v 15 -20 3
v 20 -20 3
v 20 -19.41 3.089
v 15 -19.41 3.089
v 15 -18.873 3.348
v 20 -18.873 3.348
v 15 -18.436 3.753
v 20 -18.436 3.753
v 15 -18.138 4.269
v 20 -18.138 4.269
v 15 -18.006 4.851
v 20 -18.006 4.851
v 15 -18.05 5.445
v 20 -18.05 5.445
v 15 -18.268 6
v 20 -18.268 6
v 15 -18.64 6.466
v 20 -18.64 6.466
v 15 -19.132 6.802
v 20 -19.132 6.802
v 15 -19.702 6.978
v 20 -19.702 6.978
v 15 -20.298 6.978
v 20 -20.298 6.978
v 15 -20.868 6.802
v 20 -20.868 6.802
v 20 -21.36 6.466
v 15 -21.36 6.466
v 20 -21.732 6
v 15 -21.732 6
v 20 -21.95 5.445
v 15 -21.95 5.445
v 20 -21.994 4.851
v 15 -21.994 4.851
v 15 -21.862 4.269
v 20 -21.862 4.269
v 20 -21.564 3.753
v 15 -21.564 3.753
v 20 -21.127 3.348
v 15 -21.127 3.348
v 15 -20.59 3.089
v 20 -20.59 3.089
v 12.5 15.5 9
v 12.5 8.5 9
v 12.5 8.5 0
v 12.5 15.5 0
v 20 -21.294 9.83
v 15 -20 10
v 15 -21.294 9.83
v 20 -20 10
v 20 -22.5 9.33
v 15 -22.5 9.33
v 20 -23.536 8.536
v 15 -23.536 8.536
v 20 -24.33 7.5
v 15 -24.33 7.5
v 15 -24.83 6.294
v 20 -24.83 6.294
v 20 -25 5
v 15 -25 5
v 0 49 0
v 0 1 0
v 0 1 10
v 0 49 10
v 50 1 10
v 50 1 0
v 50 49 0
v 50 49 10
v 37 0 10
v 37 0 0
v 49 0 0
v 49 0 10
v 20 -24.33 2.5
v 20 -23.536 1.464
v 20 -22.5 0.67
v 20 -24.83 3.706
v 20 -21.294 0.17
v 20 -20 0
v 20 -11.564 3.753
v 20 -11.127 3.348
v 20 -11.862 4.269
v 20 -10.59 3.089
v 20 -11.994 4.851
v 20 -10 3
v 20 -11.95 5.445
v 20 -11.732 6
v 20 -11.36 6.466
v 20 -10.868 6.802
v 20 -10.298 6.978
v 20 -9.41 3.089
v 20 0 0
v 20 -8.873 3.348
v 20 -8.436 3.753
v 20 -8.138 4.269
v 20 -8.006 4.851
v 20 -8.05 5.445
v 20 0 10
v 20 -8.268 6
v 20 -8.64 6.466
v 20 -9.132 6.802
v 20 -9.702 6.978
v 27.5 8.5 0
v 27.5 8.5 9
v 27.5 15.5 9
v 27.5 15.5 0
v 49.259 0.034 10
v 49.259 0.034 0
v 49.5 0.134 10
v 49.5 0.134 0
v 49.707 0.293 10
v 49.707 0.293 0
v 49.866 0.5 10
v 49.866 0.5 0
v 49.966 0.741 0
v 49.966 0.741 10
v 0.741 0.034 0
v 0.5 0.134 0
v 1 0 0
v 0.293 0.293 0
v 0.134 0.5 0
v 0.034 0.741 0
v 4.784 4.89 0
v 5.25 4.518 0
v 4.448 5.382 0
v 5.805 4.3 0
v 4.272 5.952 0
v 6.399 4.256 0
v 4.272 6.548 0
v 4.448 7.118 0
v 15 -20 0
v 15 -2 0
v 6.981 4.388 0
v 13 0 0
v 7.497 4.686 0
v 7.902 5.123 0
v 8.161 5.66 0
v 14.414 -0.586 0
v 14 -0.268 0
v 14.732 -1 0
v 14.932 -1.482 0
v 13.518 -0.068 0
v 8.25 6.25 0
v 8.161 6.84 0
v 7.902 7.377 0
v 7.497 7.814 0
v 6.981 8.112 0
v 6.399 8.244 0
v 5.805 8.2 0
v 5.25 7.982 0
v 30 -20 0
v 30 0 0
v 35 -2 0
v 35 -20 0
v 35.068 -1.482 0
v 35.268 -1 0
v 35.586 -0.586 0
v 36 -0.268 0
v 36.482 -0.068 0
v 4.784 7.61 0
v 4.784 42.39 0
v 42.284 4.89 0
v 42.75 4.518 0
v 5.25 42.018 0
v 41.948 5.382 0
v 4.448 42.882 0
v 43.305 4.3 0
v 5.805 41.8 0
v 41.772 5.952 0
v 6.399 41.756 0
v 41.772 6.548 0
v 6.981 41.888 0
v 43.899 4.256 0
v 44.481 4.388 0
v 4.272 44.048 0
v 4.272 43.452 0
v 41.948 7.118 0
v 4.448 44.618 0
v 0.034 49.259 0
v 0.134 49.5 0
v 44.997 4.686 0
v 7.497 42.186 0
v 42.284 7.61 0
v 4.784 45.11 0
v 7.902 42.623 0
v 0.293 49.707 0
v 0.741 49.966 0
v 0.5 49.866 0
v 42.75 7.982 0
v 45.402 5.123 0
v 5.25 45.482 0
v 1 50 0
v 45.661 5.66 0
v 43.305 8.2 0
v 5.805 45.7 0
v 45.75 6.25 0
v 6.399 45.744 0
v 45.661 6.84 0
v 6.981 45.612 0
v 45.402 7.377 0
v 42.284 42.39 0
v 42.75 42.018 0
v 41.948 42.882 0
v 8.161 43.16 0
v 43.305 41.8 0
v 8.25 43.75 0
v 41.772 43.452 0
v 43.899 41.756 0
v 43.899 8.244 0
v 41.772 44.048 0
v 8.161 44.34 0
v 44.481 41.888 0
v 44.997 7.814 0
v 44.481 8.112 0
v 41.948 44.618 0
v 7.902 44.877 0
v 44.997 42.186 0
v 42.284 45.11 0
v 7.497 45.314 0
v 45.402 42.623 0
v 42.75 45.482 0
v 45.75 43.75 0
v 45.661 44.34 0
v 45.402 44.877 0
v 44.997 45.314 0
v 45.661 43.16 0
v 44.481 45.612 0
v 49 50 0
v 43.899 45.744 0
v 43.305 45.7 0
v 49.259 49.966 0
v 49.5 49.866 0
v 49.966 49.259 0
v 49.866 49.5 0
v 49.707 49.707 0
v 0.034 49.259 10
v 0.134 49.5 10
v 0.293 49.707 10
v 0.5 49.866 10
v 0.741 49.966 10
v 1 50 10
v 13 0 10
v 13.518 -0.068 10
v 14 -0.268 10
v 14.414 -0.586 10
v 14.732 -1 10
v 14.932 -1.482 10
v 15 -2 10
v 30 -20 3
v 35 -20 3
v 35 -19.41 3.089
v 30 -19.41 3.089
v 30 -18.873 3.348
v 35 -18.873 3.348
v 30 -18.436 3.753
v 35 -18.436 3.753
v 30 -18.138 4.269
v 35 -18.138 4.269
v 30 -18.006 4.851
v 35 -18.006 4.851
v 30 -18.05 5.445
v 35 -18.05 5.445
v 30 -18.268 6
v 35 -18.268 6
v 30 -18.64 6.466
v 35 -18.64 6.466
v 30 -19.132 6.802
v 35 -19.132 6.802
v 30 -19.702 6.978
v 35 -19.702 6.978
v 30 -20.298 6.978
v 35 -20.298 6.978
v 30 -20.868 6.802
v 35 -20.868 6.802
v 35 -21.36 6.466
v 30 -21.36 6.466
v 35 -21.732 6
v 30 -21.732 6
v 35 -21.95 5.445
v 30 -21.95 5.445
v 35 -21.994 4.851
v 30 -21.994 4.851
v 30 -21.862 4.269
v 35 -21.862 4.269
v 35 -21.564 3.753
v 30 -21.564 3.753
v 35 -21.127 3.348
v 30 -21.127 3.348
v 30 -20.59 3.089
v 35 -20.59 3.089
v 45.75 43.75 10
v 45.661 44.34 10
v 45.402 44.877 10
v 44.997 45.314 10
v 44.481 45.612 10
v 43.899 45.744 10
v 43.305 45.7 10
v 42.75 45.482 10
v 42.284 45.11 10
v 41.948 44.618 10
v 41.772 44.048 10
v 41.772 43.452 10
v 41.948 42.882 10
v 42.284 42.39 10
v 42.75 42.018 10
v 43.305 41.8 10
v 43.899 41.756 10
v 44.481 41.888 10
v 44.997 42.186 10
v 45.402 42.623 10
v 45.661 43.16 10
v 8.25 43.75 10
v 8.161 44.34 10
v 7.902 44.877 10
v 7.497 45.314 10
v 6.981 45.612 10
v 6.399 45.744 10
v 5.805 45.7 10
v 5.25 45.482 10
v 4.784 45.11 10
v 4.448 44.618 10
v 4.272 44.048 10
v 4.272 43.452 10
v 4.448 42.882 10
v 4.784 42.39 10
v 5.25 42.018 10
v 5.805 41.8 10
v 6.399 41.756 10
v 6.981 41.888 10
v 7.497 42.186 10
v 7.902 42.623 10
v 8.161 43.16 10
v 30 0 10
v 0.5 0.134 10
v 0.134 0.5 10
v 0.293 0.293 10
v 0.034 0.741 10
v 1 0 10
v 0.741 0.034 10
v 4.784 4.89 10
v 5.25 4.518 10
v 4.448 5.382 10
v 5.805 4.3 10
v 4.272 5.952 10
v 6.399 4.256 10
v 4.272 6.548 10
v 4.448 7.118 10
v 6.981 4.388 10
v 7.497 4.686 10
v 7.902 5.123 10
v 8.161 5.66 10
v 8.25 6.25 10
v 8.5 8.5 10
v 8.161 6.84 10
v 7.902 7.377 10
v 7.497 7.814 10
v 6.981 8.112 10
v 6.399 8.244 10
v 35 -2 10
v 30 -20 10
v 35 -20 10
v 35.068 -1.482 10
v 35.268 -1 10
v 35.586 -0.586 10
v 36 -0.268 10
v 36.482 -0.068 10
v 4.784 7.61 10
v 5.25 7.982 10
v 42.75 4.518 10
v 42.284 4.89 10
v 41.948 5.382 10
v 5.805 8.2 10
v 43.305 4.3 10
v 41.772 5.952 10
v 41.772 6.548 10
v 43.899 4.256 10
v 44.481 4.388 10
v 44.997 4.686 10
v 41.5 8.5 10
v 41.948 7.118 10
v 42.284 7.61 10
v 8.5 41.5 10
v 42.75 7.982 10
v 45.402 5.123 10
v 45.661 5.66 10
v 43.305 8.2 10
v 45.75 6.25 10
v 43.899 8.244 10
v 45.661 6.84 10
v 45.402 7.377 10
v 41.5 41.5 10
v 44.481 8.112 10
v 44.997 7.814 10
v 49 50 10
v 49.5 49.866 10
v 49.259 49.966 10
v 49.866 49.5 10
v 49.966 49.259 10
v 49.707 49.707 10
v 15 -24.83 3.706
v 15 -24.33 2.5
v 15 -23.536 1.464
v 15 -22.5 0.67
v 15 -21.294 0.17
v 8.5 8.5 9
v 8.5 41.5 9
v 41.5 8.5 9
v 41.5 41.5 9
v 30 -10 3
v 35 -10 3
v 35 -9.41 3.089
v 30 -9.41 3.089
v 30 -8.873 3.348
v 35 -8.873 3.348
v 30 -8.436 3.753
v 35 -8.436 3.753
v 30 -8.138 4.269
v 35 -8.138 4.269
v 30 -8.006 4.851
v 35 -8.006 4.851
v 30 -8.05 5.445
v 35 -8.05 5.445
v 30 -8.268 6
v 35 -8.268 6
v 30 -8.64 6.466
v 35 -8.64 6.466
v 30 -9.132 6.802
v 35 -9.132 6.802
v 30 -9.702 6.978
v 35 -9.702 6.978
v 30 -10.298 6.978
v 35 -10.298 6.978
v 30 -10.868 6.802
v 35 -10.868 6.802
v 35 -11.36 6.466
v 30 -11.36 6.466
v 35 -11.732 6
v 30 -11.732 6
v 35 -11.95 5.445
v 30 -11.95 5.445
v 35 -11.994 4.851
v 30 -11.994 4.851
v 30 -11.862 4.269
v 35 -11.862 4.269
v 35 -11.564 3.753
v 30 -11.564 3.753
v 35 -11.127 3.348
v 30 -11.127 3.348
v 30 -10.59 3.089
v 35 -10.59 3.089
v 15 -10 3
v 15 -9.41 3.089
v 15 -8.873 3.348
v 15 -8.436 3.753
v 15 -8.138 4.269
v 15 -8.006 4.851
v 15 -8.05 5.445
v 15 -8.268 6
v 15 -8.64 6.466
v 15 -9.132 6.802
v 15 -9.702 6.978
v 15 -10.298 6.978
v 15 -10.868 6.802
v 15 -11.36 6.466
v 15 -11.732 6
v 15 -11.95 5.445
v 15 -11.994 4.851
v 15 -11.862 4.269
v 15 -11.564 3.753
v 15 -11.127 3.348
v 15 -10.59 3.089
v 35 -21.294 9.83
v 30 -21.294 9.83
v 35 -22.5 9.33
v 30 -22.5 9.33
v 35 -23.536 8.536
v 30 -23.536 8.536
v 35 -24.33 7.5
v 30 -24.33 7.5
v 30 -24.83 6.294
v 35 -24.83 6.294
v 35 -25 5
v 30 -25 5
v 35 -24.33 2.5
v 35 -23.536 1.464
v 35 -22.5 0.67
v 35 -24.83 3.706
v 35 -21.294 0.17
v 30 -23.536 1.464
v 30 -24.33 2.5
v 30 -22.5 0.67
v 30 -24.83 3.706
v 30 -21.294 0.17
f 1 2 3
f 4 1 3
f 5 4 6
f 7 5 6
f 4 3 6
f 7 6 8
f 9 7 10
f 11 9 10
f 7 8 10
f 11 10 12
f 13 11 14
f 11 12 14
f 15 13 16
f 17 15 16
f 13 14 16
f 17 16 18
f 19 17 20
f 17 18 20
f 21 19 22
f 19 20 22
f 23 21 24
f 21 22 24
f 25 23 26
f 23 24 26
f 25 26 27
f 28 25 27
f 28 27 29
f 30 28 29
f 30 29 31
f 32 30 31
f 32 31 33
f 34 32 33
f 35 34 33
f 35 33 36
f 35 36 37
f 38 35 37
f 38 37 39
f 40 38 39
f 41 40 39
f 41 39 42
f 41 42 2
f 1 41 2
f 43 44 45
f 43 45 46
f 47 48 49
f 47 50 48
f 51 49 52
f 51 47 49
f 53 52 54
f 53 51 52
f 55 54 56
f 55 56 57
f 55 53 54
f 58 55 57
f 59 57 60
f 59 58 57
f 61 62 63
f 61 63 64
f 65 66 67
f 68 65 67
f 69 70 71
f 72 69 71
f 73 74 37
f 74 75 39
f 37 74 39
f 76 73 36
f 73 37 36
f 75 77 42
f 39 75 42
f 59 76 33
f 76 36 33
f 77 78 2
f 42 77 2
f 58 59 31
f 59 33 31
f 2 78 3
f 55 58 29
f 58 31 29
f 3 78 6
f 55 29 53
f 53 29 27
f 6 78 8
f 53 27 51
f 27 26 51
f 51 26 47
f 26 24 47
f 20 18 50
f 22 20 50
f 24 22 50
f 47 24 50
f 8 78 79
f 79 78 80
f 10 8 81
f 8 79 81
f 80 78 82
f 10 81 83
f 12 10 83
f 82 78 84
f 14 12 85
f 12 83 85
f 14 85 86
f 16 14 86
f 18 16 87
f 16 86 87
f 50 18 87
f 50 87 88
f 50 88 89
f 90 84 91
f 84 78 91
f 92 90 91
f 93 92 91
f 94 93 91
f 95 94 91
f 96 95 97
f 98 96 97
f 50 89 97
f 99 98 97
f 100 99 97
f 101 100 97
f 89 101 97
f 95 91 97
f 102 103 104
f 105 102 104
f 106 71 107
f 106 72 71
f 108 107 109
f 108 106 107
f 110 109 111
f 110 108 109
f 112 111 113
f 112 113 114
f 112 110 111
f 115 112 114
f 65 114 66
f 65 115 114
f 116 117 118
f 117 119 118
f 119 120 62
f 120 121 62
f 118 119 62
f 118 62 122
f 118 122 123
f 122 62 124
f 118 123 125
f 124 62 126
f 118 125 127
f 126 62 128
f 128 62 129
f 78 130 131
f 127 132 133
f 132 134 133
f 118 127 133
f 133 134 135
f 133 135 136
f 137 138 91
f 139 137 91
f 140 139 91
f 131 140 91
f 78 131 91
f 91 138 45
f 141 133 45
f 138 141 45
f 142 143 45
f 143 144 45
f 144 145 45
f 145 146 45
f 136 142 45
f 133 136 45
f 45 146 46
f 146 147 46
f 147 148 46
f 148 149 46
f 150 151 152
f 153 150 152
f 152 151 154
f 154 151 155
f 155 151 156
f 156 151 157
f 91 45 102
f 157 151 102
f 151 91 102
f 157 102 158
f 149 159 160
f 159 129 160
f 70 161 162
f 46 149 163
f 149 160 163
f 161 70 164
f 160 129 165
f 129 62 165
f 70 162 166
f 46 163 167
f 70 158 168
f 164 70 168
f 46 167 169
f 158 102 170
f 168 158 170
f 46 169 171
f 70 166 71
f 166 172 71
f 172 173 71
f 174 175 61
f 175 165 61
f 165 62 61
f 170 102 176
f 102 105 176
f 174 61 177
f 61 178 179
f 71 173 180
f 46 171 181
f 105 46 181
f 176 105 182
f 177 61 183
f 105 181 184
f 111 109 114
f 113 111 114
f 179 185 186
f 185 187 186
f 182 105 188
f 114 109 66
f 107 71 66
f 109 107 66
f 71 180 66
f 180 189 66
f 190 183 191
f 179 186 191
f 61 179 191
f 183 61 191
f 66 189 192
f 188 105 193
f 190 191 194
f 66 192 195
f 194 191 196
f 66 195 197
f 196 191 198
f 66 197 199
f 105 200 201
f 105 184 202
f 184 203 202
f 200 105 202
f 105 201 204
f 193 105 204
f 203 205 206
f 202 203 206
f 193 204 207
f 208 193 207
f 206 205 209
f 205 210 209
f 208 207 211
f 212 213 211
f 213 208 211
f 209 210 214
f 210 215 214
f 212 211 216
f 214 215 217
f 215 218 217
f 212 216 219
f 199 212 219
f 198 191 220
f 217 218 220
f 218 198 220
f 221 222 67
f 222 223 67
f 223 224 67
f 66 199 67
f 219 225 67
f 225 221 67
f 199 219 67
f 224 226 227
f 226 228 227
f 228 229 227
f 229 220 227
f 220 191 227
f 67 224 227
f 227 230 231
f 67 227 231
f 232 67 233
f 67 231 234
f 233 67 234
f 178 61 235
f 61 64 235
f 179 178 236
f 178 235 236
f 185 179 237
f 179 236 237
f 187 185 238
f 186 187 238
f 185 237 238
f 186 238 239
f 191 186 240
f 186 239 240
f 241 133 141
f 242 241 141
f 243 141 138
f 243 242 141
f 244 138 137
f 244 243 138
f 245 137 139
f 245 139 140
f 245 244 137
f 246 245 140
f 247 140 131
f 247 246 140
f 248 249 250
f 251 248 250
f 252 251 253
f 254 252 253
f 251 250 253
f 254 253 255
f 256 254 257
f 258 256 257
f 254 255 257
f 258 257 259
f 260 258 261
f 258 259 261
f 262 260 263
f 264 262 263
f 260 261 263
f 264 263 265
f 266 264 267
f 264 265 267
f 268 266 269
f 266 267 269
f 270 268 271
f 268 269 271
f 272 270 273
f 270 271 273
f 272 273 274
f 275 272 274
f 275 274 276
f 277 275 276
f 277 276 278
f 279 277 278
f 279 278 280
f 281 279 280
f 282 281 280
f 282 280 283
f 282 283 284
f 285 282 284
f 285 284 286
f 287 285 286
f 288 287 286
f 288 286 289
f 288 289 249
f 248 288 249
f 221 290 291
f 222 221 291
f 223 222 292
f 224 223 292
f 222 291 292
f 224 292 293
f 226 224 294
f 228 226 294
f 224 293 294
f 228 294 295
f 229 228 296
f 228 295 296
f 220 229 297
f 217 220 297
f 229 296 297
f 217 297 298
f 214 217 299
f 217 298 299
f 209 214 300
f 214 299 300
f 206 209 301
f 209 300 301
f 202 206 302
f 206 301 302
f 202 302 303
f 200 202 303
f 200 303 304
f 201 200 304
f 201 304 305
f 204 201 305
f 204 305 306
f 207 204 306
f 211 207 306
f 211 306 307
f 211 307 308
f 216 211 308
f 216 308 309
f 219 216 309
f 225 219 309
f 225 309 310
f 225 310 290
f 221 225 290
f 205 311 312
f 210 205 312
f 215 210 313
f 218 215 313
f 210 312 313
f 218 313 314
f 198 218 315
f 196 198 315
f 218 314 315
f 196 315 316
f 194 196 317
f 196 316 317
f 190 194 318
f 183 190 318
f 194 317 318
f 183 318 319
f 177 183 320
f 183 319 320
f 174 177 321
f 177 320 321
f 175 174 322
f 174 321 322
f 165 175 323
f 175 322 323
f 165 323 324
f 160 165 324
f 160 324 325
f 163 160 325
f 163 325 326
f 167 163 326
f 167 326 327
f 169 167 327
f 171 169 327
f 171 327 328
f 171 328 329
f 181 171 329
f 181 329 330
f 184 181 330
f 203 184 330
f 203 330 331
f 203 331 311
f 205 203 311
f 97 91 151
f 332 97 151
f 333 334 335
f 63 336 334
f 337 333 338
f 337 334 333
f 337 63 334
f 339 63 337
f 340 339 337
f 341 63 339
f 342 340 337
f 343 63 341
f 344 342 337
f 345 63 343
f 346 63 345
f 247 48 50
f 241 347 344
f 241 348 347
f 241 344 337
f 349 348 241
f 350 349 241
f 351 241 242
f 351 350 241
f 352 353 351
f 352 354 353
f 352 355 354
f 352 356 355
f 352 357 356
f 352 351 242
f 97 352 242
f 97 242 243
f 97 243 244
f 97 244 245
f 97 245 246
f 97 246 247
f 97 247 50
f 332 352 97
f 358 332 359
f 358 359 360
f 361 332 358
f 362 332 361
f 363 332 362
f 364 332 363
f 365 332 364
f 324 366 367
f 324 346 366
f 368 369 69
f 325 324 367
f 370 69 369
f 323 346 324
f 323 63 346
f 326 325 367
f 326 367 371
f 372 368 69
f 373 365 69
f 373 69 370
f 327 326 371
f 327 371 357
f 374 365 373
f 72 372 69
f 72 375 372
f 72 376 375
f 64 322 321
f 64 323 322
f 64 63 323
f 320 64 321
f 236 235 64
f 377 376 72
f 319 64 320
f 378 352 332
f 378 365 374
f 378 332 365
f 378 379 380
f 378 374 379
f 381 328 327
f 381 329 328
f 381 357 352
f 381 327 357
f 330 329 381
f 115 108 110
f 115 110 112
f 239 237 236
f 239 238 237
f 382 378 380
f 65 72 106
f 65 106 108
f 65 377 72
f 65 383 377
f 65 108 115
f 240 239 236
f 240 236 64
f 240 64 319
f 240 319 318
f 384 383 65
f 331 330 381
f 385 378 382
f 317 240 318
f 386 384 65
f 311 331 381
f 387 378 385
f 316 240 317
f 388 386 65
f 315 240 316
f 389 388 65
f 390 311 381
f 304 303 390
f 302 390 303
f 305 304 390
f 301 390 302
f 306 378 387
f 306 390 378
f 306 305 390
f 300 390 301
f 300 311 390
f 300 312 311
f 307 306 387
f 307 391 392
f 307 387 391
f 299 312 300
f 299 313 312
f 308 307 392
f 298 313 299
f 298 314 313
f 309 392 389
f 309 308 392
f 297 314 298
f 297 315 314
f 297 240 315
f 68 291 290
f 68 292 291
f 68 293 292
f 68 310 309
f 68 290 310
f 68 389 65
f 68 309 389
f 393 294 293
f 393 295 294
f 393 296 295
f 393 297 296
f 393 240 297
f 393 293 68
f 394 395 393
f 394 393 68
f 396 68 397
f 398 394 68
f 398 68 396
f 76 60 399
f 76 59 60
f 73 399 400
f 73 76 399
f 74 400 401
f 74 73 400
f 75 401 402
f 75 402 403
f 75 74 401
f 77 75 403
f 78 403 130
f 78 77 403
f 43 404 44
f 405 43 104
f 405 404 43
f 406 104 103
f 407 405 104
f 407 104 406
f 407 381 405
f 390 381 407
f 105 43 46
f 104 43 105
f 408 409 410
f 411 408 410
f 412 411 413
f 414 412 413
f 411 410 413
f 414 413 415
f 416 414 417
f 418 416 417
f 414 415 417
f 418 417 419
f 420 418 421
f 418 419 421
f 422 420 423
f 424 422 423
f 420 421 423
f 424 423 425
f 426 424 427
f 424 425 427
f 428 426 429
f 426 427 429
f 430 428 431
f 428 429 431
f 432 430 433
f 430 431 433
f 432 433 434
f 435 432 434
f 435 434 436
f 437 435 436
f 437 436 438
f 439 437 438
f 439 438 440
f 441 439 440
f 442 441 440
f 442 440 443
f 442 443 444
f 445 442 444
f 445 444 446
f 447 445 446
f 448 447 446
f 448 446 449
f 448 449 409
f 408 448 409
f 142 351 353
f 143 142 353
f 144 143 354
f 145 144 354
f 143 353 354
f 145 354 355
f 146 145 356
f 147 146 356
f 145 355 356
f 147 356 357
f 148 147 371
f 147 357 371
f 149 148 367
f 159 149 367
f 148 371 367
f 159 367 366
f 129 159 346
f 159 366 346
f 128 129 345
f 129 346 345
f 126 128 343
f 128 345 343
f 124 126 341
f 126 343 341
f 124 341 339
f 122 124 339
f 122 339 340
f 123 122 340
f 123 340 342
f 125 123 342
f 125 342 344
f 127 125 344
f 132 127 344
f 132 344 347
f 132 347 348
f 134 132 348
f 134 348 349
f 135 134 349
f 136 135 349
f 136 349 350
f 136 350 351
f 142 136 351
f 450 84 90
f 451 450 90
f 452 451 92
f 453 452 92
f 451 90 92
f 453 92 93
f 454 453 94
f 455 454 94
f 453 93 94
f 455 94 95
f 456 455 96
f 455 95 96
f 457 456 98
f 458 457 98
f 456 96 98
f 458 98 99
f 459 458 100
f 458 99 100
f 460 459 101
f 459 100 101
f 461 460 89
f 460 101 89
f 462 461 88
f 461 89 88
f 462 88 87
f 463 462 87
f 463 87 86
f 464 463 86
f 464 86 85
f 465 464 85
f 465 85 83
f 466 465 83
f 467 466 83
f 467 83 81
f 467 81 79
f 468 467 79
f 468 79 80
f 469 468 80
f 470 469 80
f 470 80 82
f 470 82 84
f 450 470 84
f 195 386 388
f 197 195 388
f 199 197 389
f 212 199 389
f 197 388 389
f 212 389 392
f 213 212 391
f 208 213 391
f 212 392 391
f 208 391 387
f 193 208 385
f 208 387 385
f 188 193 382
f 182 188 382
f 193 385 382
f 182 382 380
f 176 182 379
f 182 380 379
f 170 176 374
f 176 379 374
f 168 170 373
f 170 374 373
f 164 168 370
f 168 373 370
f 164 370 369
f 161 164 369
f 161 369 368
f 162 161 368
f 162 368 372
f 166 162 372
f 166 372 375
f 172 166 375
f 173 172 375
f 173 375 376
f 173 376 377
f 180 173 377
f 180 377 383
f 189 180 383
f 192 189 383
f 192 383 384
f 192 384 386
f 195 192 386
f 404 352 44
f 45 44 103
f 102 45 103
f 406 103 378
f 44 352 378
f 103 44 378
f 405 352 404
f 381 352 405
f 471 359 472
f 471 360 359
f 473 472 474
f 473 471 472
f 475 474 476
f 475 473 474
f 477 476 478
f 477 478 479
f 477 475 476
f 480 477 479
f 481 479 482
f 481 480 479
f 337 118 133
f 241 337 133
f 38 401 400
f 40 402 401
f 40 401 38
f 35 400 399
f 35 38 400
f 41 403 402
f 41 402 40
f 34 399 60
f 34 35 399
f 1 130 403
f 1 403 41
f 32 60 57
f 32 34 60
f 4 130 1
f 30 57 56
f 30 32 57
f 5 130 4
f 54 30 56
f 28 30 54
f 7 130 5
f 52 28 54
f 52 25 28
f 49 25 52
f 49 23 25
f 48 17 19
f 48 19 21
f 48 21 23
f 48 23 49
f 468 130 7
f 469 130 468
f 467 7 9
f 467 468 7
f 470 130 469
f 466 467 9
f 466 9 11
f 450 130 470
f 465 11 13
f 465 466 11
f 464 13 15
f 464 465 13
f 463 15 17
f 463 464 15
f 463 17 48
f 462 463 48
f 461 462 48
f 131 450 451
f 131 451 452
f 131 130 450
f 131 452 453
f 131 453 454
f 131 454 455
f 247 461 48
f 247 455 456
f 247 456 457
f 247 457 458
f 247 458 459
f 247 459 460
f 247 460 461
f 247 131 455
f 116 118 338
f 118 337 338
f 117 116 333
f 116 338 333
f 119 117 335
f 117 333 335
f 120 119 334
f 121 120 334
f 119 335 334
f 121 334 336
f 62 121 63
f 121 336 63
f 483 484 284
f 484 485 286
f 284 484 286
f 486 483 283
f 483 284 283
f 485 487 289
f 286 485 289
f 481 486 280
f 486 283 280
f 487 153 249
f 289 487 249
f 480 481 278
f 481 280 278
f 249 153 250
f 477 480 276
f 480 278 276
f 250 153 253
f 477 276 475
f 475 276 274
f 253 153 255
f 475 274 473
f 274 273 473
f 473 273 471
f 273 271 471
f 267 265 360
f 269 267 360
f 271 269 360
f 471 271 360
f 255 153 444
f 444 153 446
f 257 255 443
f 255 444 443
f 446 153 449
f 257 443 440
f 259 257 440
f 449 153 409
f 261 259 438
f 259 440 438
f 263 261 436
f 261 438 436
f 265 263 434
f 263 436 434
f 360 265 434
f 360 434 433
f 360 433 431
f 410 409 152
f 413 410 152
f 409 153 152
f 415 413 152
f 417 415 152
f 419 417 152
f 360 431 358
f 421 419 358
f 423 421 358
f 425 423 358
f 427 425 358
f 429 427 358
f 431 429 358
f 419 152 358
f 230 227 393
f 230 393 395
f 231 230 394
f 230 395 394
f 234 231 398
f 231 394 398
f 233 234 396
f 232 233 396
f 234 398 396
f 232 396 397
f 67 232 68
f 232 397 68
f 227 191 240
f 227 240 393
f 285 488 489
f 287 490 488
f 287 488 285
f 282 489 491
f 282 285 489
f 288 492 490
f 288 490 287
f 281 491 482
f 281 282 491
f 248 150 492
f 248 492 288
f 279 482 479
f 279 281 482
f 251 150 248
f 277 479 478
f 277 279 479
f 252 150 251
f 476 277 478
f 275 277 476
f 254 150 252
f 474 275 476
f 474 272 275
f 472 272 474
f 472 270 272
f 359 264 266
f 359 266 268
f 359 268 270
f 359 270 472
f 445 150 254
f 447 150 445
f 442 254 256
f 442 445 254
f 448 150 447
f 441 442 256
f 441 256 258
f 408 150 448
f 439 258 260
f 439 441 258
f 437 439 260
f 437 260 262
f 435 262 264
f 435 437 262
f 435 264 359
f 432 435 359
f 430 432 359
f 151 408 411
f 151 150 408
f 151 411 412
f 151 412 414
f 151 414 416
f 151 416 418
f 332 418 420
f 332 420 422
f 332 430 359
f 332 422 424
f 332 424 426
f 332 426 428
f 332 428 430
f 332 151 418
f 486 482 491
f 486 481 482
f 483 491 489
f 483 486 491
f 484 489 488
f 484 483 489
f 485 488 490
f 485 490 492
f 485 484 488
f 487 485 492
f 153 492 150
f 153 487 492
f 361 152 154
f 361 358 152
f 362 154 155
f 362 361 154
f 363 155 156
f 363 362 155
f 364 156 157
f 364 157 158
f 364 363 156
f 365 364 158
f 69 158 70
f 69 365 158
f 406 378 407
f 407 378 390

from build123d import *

# Parameters (mm, degrees)
SKETCH1_W           = 50
SKETCH1_H           = 50
BOSS_EXTRUDE1_DEPTH = 10
SKETCH2_W           = 5
SKETCH2_H           = 10
BOSS_EXTRUDE2_DEPTH = 25
SKETCH3_R           = 2
CUT_EXTRUDE1_DEPTH  = 25
SKETCH4_R           = 2
CUT_EXTRUDE2_DEPTH  = 25
FILLET2_R           = 5
FILLET3_R           = 5
FILLET4_R           = 1
FILLET5_R           = 2
FILLET6_R           = 2
SKETCH5_W           = 33
SKETCH5_H           = 33
CUT_EXTRUDE3_DEPTH  = 1
SKETCH6_W           = 15
SKETCH6_H           = 7
CUT_EXTRUDE4_DEPTH  = 16


with BuildPart() as part:
    # Sketch1 → Boss-Extrude1 (new body)
    with BuildSketch(Plane.XY):
        with Locations((25, 25)):
            Rectangle(SKETCH1_W, SKETCH1_H)
    extrude(amount=BOSS_EXTRUDE1_DEPTH)

    # Sketch2 → Boss-Extrude2 (add)
    with BuildSketch(Plane.XZ):
        with Locations((17.5, 5)):
            Rectangle(SKETCH2_W, SKETCH2_H)
        with Locations((32.5, 5)):
            Rectangle(SKETCH2_W, SKETCH2_H)
    extrude(amount=BOSS_EXTRUDE2_DEPTH)

    # Sketch3 → Cut-Extrude1 (cut)
    with BuildSketch(Plane.XY.offset(10)):
        with Locations((43.75, 43.75)):
            Circle(SKETCH3_R)
        with Locations((6.25, 43.75)):
            Circle(SKETCH3_R)
        with Locations((6.25, 6.25)):
            Circle(SKETCH3_R)
        with Locations((43.75, 6.25)):
            Circle(SKETCH3_R)
    extrude(amount=-CUT_EXTRUDE1_DEPTH, mode=Mode.SUBTRACT)

    # Sketch4 → Cut-Extrude2 (cut)
    with BuildSketch(Plane(origin=(35, 0, 0), x_dir=(0, 0, -1), z_dir=(1, 0, 0))):
        with Locations((-5, -10)):
            Circle(SKETCH4_R)
        with Locations((-5, -20)):
            Circle(SKETCH4_R)
    extrude(amount=-CUT_EXTRUDE2_DEPTH, mode=Mode.SUBTRACT)

    # Fillet2
    fillet2_edges = [part.edges().sort_by_distance(p)[0] for p in [
        (32.5, -25, 10),
    ]]
    fillet(fillet2_edges, radius=FILLET2_R)

    # Fillet3
    fillet3_edges = [part.edges().sort_by_distance(p)[0] for p in [
        (17.5, -25, 10),
        (17.5, -25, 0),
        (32.5, -25, 0),
    ]]
    fillet(fillet3_edges, radius=FILLET3_R - 0.0001)  # a hair under: the kernel refuses the full size

    # Fillet4
    fillet4_edges = [part.edges().sort_by_distance(p)[0] for p in [
        (0, 50, 5),
        (50, 50, 5),
        (50, 0, 5),
        (0, 0, 5),
    ]]
    fillet(fillet4_edges, radius=FILLET4_R)

    # Fillet5
    fillet5_edges = [part.edges().sort_by_distance(p)[0] for p in [
        (15, 0, 5),
    ]]
    fillet(fillet5_edges, radius=FILLET5_R)

    # Fillet6
    fillet6_edges = [part.edges().sort_by_distance(p)[0] for p in [
        (35, 0, 5),
    ]]
    fillet(fillet6_edges, radius=FILLET6_R)

    # Sketch5 → Cut-Extrude3 (cut)
    with BuildSketch(Plane.XY.offset(10)):
        with Locations((25, 25)):
            Rectangle(SKETCH5_W, SKETCH5_H)
    extrude(amount=-CUT_EXTRUDE3_DEPTH, mode=Mode.SUBTRACT)

    # Sketch6 → Cut-Extrude4 (cut)
    with BuildSketch(Plane.XY.offset(9)):
        with Locations((20, 12)):
            Rectangle(SKETCH6_W, SKETCH6_H)
    extrude(amount=-CUT_EXTRUDE4_DEPTH, mode=Mode.SUBTRACT)


solid = part.part
